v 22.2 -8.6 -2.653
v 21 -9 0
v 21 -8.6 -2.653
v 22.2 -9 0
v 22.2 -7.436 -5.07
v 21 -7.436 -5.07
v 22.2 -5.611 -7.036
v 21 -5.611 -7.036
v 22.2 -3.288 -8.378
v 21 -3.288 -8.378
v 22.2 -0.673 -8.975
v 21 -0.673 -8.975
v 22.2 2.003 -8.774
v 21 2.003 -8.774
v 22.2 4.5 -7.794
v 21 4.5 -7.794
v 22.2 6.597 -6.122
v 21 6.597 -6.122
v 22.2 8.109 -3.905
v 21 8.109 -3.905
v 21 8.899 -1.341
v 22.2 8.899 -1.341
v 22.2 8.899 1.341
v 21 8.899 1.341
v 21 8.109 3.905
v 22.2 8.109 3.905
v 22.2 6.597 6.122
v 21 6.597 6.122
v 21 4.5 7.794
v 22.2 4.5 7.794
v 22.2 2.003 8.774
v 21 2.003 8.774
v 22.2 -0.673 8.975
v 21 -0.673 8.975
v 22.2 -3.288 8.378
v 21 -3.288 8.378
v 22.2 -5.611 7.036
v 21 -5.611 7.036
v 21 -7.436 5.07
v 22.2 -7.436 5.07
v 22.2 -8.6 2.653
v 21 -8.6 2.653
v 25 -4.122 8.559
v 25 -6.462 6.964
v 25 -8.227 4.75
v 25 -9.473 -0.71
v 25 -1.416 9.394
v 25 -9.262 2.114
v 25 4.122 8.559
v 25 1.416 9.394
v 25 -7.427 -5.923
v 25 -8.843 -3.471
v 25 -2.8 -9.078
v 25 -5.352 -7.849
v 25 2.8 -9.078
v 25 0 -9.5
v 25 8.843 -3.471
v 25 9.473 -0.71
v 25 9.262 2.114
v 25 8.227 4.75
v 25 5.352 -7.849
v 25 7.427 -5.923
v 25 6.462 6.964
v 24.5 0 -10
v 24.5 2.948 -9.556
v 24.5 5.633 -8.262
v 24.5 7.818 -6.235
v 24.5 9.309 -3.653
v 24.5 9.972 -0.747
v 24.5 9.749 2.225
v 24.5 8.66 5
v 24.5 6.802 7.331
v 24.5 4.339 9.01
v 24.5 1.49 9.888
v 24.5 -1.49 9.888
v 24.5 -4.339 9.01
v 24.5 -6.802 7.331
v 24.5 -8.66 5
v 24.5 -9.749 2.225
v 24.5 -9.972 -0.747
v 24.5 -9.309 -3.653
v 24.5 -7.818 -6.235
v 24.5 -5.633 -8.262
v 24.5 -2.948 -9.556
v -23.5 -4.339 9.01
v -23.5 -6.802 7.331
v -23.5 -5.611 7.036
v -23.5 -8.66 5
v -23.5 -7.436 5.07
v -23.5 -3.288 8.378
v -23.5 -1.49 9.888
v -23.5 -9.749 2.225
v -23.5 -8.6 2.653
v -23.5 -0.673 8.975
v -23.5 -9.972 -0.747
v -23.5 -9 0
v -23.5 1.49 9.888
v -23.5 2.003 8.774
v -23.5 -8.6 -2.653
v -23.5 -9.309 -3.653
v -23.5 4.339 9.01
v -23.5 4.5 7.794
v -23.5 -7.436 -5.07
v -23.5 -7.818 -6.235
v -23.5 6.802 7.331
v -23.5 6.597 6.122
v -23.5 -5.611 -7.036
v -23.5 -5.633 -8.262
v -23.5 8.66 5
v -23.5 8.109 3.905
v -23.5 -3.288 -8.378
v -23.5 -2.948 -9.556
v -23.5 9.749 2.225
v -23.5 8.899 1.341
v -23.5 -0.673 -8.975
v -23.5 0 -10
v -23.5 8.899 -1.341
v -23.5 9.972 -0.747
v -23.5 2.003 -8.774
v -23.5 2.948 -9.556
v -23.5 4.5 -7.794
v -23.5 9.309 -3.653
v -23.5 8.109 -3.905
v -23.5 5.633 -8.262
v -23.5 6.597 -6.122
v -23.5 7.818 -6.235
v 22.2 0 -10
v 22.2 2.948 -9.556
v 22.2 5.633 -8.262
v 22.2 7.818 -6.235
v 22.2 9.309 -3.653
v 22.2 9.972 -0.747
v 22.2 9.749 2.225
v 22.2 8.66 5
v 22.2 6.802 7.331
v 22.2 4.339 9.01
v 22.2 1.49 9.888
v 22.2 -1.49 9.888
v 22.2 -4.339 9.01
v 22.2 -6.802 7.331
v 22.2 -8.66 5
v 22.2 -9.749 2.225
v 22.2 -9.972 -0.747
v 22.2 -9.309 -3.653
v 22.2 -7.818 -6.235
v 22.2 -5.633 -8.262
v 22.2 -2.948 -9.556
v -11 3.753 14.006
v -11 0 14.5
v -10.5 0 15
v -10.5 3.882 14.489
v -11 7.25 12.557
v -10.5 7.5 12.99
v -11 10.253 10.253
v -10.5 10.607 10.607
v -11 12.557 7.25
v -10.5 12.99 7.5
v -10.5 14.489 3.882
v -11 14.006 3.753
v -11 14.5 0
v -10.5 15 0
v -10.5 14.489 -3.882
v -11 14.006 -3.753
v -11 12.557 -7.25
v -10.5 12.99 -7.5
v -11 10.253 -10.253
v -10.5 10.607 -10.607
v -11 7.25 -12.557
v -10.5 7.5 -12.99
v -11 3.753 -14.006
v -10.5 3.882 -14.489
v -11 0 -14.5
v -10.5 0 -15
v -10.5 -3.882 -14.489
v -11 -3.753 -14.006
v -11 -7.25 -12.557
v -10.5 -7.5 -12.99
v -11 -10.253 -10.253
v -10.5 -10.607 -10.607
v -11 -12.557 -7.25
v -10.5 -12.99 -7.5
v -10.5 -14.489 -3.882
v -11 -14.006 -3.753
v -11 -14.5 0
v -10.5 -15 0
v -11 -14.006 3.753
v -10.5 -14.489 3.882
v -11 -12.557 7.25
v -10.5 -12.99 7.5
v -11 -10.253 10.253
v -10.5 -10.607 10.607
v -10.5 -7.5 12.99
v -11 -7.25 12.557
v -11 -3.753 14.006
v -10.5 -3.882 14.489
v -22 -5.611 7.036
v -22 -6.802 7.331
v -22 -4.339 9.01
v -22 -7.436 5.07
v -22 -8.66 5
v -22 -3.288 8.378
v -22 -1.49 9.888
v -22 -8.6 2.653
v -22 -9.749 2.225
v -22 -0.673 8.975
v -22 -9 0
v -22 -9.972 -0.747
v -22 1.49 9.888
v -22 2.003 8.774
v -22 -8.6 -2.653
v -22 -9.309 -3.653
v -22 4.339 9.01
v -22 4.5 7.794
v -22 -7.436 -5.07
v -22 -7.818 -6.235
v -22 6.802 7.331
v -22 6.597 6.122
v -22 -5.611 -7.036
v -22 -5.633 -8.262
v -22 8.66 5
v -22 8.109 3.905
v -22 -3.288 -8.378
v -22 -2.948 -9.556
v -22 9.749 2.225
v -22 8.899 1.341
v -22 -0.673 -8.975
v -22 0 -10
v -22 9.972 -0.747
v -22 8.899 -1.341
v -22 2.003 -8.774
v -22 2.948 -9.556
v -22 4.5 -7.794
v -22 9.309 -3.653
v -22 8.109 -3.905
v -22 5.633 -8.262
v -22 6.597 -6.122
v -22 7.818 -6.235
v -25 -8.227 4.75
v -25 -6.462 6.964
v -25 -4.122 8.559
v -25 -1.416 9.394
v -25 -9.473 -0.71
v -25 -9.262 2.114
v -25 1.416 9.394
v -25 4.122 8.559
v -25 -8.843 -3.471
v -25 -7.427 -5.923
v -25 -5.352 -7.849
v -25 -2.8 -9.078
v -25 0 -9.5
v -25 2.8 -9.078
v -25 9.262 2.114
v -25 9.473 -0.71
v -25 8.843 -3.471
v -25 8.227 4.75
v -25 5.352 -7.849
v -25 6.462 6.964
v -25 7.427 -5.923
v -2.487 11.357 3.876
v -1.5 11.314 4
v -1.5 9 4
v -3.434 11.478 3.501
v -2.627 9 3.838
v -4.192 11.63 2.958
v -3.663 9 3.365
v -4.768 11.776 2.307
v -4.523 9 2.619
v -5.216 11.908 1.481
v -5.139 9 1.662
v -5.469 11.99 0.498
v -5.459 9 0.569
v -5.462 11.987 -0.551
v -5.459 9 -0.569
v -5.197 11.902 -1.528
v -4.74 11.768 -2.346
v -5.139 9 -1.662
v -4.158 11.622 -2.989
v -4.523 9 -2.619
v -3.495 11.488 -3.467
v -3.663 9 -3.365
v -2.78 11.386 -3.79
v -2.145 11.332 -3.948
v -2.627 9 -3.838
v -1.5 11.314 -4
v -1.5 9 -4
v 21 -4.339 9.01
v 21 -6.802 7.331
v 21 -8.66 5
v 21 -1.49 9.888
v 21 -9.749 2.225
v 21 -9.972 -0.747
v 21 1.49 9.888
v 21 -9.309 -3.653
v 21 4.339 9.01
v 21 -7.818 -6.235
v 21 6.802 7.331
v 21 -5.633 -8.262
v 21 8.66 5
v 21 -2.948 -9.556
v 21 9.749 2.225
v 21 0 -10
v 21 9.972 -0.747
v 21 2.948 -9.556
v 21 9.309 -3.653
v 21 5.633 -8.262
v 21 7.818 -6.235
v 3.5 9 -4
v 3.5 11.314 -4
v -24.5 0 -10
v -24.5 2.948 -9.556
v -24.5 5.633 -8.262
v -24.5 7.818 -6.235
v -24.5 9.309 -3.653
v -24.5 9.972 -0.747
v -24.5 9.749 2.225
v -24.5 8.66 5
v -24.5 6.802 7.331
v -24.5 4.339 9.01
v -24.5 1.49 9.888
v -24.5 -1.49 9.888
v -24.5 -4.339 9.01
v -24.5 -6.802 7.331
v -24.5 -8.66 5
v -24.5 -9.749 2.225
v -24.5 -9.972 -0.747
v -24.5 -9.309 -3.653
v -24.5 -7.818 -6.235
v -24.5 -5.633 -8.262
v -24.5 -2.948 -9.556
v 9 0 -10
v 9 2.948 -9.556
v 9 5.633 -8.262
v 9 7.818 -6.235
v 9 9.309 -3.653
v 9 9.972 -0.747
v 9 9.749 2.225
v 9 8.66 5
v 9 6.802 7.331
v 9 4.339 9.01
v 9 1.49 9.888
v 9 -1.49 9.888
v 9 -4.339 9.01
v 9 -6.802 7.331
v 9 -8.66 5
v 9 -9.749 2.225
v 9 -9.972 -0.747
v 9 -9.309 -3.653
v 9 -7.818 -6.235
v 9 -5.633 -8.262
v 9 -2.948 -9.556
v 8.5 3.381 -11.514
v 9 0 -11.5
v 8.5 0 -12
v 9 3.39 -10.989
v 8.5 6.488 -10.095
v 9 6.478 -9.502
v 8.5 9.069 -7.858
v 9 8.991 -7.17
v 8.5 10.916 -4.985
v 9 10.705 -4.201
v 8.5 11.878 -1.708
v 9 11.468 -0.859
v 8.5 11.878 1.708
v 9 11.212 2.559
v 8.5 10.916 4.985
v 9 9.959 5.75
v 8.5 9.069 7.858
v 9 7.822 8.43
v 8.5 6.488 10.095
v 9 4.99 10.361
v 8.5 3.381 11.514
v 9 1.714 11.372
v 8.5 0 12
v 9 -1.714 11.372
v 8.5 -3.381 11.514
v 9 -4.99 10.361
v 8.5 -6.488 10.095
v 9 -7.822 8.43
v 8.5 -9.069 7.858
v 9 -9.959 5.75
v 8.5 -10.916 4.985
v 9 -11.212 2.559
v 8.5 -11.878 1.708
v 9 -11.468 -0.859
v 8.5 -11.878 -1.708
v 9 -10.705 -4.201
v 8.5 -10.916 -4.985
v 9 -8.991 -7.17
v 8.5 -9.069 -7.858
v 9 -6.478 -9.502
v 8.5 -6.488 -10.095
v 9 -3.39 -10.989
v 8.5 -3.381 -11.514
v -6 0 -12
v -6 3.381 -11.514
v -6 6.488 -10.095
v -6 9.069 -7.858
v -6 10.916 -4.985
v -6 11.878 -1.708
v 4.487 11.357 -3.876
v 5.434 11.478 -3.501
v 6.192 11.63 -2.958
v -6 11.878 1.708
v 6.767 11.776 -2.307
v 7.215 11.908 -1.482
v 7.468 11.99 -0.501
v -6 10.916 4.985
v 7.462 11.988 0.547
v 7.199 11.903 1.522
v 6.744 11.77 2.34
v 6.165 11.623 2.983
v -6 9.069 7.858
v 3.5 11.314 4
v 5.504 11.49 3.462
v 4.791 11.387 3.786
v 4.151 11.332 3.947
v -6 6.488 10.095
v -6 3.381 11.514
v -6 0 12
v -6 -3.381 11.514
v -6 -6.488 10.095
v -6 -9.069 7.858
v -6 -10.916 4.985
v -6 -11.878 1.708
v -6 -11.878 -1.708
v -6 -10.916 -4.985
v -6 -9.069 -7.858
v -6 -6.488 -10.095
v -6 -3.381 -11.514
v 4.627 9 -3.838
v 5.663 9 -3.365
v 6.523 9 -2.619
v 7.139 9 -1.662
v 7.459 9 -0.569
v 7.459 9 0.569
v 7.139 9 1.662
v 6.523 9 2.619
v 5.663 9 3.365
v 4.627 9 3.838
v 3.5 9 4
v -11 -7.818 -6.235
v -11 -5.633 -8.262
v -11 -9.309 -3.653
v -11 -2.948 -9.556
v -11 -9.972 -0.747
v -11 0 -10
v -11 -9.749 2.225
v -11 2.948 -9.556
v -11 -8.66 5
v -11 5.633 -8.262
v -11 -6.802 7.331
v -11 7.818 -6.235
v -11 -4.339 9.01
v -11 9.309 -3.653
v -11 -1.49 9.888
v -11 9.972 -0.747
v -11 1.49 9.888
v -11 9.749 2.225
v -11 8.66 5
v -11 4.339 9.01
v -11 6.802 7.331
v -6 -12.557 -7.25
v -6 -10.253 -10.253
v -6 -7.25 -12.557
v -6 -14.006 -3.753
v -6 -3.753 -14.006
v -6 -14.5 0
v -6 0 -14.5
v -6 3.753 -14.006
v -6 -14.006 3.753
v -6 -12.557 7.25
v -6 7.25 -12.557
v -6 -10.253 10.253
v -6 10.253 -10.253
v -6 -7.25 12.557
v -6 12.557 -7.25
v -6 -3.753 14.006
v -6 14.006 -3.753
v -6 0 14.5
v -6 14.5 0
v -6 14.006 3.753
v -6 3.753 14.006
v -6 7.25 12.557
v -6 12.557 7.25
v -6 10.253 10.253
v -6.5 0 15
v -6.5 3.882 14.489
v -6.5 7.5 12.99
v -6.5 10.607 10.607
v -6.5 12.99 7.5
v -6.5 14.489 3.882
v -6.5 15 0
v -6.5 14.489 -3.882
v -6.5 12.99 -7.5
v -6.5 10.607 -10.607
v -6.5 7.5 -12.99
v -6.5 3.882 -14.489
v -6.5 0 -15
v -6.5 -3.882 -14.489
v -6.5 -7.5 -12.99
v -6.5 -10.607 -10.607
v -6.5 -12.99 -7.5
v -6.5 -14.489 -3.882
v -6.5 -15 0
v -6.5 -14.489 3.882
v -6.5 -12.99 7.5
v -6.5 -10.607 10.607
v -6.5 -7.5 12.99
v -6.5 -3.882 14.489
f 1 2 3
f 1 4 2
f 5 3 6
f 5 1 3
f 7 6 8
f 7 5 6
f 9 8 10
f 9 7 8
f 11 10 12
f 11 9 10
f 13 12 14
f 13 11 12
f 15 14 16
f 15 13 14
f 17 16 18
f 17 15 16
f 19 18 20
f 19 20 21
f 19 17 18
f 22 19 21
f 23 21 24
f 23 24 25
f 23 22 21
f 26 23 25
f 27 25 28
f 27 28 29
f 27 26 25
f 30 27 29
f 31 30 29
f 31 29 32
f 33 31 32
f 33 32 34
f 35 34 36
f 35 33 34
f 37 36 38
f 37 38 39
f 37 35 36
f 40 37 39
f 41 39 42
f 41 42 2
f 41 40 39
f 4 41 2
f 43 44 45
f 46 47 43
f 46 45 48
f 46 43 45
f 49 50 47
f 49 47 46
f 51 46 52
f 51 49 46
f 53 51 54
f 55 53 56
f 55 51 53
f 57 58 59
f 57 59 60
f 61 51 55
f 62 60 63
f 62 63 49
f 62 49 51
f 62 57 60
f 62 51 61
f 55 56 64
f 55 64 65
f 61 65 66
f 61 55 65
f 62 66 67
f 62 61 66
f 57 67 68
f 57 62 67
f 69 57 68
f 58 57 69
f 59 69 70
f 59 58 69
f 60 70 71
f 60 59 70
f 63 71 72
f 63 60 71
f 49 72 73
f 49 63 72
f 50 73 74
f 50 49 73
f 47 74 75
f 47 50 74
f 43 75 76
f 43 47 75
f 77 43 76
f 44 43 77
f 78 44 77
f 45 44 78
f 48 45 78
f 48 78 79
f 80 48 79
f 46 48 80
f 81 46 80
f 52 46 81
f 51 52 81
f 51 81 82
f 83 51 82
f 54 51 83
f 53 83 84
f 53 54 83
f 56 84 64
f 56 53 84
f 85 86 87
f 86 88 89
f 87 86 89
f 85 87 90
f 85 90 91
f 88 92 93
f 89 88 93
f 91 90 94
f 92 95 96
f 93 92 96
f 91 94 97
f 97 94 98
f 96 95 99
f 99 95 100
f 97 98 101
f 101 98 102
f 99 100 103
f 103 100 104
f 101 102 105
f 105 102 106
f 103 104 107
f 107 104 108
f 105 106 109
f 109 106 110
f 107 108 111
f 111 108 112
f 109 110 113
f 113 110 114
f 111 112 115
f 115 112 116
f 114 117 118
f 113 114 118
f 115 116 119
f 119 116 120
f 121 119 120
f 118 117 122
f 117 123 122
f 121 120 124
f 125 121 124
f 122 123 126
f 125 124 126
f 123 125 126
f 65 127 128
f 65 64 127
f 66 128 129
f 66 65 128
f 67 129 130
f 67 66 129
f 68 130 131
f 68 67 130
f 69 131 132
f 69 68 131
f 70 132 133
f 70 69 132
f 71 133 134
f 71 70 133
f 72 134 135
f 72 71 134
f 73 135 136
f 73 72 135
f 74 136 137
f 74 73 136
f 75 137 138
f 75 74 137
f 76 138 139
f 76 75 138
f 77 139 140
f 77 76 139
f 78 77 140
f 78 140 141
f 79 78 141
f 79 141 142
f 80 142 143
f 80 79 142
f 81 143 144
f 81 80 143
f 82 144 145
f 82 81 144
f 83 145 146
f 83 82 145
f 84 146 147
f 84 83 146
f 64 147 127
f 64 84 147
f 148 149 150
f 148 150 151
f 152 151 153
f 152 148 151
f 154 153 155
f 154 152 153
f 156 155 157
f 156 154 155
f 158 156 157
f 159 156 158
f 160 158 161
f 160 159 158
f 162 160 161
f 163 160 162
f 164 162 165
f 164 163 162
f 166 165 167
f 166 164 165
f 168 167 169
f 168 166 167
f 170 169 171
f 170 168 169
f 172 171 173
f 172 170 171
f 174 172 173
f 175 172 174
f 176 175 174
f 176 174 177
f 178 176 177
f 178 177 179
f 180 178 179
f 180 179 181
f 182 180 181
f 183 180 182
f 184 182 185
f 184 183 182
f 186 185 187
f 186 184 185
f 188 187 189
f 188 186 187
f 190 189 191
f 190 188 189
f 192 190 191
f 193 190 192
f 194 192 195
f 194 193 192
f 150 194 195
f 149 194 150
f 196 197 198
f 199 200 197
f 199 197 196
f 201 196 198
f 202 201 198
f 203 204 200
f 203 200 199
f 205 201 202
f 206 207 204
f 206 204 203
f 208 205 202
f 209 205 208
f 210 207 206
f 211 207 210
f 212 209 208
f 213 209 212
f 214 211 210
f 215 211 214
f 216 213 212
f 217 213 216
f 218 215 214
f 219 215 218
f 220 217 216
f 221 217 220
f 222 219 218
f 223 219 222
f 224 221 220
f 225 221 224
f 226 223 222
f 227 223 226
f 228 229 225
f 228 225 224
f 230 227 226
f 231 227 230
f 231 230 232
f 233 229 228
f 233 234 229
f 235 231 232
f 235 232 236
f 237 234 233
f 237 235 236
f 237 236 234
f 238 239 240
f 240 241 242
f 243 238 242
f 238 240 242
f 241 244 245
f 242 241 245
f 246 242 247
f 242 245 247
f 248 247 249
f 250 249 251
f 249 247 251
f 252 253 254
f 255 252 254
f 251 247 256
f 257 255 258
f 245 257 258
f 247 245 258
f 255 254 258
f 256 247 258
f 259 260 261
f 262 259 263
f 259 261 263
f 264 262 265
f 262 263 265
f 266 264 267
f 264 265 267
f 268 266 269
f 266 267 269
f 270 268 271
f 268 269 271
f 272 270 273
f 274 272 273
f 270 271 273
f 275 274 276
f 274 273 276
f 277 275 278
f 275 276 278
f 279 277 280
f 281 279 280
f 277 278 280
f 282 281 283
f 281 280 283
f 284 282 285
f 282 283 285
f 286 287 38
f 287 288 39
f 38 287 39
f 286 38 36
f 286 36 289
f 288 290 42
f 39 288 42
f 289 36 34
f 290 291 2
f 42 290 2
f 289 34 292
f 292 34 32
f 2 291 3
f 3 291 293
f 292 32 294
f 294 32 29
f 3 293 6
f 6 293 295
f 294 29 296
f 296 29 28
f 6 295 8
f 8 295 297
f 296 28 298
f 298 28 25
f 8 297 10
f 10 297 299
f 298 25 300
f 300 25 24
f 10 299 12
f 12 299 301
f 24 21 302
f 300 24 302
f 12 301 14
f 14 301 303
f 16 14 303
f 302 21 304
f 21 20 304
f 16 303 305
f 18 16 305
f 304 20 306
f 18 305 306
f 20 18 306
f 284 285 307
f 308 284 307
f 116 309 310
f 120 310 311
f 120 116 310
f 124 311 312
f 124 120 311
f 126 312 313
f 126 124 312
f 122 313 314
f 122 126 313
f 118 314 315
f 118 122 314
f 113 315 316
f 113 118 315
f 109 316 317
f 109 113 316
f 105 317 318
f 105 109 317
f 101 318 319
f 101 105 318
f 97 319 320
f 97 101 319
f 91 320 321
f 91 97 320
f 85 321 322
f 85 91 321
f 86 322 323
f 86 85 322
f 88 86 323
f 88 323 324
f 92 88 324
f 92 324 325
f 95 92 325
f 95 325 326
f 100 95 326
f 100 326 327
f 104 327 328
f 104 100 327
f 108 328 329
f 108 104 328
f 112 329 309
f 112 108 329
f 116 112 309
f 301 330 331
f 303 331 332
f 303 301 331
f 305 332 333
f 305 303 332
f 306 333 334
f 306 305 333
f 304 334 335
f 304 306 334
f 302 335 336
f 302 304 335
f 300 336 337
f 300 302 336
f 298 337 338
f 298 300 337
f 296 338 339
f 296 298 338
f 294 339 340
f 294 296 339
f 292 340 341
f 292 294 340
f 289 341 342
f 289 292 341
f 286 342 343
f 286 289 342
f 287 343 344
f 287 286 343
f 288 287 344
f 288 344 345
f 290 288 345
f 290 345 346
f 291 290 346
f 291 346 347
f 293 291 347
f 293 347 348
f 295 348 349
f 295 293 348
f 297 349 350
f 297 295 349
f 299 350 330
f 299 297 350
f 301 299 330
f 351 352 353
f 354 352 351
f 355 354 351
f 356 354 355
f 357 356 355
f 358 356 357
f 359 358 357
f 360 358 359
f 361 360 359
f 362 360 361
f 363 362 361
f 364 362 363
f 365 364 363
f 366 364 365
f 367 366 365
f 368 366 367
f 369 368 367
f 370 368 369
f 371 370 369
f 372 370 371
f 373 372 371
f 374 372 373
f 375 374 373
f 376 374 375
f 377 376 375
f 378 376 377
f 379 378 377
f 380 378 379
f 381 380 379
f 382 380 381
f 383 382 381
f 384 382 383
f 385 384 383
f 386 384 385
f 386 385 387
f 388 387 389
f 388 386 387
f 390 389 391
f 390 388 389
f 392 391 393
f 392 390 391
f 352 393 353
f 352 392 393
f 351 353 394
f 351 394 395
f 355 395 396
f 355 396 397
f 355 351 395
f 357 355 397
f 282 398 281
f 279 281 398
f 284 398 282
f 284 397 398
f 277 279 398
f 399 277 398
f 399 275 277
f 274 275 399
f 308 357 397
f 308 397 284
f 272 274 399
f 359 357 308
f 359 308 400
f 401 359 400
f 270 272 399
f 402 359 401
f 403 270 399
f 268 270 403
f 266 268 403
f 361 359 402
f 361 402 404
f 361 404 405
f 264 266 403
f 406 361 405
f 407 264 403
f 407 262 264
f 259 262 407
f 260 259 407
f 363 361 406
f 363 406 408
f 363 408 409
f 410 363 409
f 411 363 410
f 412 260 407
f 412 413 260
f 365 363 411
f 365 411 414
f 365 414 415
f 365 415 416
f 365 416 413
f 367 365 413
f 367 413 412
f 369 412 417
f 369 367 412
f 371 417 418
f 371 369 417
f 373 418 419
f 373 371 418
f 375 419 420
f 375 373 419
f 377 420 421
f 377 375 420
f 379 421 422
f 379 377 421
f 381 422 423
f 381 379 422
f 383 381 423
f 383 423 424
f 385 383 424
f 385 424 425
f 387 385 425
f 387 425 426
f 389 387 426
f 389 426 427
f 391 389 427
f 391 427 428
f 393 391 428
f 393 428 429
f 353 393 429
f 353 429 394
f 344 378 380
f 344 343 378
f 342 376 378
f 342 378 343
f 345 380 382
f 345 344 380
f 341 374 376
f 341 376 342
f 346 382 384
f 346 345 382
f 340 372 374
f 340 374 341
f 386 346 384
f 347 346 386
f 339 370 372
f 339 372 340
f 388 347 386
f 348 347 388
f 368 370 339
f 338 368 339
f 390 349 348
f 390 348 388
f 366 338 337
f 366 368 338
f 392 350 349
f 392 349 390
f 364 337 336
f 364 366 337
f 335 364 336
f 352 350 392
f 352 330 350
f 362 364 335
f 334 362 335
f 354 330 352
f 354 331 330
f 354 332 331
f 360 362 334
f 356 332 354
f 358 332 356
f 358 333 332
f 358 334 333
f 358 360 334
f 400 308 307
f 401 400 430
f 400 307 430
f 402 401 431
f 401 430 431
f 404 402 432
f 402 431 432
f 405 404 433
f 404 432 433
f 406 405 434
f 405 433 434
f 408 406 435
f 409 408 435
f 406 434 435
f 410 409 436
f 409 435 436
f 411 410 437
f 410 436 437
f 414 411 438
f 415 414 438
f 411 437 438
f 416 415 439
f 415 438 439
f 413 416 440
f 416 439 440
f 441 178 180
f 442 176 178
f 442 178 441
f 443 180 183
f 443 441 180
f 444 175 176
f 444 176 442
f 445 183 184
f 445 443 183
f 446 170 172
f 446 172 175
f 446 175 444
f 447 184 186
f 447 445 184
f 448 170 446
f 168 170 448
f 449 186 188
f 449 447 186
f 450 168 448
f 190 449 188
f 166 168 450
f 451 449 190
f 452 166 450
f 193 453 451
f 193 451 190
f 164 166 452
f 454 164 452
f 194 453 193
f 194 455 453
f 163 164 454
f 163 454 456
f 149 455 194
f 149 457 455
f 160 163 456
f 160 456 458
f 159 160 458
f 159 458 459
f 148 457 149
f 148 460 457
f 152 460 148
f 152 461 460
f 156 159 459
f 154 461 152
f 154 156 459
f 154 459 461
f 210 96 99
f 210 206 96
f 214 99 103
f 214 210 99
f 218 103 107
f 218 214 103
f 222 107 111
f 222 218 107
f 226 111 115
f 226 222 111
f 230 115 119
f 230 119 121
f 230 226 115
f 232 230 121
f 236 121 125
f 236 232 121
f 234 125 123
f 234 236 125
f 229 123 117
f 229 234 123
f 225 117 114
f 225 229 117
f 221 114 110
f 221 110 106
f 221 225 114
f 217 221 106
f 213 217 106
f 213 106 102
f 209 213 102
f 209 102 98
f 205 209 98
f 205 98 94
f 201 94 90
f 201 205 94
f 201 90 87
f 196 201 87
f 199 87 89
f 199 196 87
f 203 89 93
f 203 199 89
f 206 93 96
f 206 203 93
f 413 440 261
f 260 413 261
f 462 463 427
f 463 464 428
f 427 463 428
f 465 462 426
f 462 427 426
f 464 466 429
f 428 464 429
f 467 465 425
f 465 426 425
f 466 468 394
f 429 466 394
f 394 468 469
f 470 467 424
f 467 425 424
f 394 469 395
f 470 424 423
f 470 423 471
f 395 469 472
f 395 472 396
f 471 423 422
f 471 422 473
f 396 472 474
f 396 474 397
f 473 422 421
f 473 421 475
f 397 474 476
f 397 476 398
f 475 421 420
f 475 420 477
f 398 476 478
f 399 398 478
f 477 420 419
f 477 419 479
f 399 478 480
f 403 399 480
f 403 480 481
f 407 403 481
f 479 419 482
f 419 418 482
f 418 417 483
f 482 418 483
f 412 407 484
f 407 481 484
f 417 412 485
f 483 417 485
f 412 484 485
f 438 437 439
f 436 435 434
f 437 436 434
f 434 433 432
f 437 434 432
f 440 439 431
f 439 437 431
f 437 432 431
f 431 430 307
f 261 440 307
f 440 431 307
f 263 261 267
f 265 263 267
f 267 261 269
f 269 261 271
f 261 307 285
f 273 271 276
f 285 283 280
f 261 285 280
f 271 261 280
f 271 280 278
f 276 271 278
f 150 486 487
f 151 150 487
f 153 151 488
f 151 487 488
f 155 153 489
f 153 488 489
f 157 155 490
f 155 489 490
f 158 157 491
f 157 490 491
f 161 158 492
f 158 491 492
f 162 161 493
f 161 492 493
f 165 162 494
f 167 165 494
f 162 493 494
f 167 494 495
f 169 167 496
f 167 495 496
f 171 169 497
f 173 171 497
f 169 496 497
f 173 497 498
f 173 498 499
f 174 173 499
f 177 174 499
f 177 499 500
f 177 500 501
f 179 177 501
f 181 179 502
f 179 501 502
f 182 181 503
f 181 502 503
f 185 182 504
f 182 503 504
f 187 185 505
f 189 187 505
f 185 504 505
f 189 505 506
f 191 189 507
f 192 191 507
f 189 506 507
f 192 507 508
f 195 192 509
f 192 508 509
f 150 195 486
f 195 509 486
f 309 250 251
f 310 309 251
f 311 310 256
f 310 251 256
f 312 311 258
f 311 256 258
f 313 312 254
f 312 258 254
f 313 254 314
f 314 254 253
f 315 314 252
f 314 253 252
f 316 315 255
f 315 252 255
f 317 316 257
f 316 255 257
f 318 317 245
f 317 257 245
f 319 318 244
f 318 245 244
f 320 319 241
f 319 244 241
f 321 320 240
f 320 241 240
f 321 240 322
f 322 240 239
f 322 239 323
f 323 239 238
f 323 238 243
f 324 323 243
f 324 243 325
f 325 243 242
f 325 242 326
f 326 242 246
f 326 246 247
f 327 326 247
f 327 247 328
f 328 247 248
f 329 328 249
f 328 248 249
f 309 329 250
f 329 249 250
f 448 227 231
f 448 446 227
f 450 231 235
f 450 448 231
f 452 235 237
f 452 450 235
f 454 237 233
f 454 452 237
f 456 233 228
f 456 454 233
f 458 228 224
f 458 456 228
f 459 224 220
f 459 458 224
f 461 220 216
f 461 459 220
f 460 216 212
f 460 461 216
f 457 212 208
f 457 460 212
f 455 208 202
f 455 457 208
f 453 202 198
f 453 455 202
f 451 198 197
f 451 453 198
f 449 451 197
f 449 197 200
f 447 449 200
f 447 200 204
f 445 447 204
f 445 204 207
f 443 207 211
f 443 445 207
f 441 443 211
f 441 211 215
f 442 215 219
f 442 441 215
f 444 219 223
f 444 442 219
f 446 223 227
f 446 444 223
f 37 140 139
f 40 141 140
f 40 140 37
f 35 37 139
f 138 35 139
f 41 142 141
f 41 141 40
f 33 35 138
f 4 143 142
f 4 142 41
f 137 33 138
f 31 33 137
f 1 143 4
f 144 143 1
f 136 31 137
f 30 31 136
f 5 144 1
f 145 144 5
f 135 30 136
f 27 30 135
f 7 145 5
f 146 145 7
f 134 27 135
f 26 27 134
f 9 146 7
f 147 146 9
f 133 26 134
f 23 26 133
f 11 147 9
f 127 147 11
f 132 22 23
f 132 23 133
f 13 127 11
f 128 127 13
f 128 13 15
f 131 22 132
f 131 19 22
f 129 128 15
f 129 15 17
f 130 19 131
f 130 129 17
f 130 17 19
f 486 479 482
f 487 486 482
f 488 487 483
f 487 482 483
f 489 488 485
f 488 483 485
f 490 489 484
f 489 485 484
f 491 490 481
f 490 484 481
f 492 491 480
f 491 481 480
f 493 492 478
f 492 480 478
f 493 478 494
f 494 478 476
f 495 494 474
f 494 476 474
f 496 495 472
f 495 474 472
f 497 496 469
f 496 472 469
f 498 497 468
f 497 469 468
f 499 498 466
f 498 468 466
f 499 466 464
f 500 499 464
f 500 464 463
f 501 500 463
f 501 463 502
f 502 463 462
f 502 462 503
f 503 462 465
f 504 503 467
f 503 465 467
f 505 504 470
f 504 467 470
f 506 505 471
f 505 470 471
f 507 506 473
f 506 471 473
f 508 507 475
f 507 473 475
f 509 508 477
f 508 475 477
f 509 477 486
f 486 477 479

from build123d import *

# Parameters (mm, degrees)
SCHIZZO1_R                    = 10
ESTRUSIONE_ESTRUSIONE1_DEPTH  = 25
ESTRUSIONE_ESTRUSIONE2_START  = -16
SCHIZZO2_R                    = 12
SCHIZZO2_R_2                  = 10
ESTRUSIONE_ESTRUSIONE2_DEPTH  = 15
ESTRUSIONE_ESTRUSIONE3_START  = -19
SCHIZZO3_R                    = 15
SCHIZZO3_R_2                  = 10
ESTRUSIONE_ESTRUSIONE3_DEPTH  = 5
TAGLIO_ESTRUSIONE1_REACH      = 43.787
TAGLIO_ESTRUSIONE1_END_RADIUS = 12
TAGLIO_ESTRUSIONE1_START      = 9
SMUSSO1_SIZE                  = 0.5
SCHIZZO7_W                    = 1.2
SCHIZZO7_H                    = 1
SCHIZZO7_W_2                  = 1.5


with BuildPart() as part:
    # Schizzo1 → Estrusione-Estrusione1 (new, symmetric)
    with BuildSketch(Plane(origin=(0, 0, 0), x_dir=(0, 0, -1), z_dir=(1, 0, 0))):
        Circle(SCHIZZO1_R)
    extrude(amount=ESTRUSIONE_ESTRUSIONE1_DEPTH, both=True)

    # Schizzo2 → Estrusione-Estrusione2 (add)
    with BuildSketch(Plane(origin=(25, 0, 0), x_dir=(0, 0, -1), z_dir=(1, 0, 0)).offset(ESTRUSIONE_ESTRUSIONE2_START)):
        Circle(SCHIZZO2_R)
        Circle(SCHIZZO2_R_2, mode=Mode.SUBTRACT)
    extrude(amount=-ESTRUSIONE_ESTRUSIONE2_DEPTH)

    # Schizzo3 → Estrusione-Estrusione3 (add)
    with BuildSketch(Plane.ZY.offset(25).offset(ESTRUSIONE_ESTRUSIONE3_START)):
        Circle(SCHIZZO3_R)
        with Locations(Location((0, 0, 0), (0, 0, 180))):
            Circle(SCHIZZO3_R_2, mode=Mode.SUBTRACT)
    extrude(amount=ESTRUSIONE_ESTRUSIONE3_DEPTH)

    # Taglio-Estrusione1: up to this cylinder (the profile starts inside it)
    taglio_estrusione1_end = Plane(origin=(1, 0, 0), z_dir=(1, 0, 0)) * Cylinder(TAGLIO_ESTRUSIONE1_END_RADIUS, 112.574, mode=Mode.PRIVATE)
    # Schizzo5 → Taglio-Estrusione1 (cut, up to the surface)
    with BuildSketch(Plane(origin=(0, 0, 0), x_dir=(1, 0, 0), z_dir=(0, 1, 0)).offset(TAGLIO_ESTRUSIONE1_START), mode=Mode.PRIVATE) as taglio_estrusione1_sk1:
        with BuildLine():
            Line((-1.5, 4), (3.5, 4))
            ThreePointArc((3.5, 4), (7.5, 0), (3.5, -4))
            Line((3.5, -4), (-1.5, -4))
            ThreePointArc((-1.5, -4), (-5.5, 0), (-1.5, 4))
        make_face()
    taglio_estrusione1_tool1 = extrude(taglio_estrusione1_sk1.sketch, amount=TAGLIO_ESTRUSIONE1_REACH, mode=Mode.PRIVATE) & taglio_estrusione1_end
    add(taglio_estrusione1_tool1.solids().sort_by_distance((1, 9, 0))[0], mode=Mode.SUBTRACT)

    # Smusso1
    smusso1_edges = [part.edges().sort_by_distance(p)[0] for p in [
        (-6, 0, -15),
        (-11, 0, -15),
        (-25, 0, 10),
        (25, 0, 10),
        (9, 0, 12),
    ]]
    chamfer(smusso1_edges, length=SMUSSO1_SIZE)

    # Schizzo7 → Taglia-Rivoluzione1 (revolve, cut)
    with BuildSketch(Plane.XY, mode=Mode.PRIVATE) as taglia_rivoluzione1_sk:
        with Locations((21.6, 9.5)):
            Rectangle(SCHIZZO7_W, SCHIZZO7_H)
        with Locations((-22.75, 9.5)):
            Rectangle(SCHIZZO7_W_2, SCHIZZO7_H)
    revolve(taglia_rivoluzione1_sk.sketch.rotate(Axis((-25, 0, 0), (1, 0, 0)), 180), axis=Axis((-25, 0, 0), (1, 0, 0)), mode=Mode.SUBTRACT)


solid = part.part
